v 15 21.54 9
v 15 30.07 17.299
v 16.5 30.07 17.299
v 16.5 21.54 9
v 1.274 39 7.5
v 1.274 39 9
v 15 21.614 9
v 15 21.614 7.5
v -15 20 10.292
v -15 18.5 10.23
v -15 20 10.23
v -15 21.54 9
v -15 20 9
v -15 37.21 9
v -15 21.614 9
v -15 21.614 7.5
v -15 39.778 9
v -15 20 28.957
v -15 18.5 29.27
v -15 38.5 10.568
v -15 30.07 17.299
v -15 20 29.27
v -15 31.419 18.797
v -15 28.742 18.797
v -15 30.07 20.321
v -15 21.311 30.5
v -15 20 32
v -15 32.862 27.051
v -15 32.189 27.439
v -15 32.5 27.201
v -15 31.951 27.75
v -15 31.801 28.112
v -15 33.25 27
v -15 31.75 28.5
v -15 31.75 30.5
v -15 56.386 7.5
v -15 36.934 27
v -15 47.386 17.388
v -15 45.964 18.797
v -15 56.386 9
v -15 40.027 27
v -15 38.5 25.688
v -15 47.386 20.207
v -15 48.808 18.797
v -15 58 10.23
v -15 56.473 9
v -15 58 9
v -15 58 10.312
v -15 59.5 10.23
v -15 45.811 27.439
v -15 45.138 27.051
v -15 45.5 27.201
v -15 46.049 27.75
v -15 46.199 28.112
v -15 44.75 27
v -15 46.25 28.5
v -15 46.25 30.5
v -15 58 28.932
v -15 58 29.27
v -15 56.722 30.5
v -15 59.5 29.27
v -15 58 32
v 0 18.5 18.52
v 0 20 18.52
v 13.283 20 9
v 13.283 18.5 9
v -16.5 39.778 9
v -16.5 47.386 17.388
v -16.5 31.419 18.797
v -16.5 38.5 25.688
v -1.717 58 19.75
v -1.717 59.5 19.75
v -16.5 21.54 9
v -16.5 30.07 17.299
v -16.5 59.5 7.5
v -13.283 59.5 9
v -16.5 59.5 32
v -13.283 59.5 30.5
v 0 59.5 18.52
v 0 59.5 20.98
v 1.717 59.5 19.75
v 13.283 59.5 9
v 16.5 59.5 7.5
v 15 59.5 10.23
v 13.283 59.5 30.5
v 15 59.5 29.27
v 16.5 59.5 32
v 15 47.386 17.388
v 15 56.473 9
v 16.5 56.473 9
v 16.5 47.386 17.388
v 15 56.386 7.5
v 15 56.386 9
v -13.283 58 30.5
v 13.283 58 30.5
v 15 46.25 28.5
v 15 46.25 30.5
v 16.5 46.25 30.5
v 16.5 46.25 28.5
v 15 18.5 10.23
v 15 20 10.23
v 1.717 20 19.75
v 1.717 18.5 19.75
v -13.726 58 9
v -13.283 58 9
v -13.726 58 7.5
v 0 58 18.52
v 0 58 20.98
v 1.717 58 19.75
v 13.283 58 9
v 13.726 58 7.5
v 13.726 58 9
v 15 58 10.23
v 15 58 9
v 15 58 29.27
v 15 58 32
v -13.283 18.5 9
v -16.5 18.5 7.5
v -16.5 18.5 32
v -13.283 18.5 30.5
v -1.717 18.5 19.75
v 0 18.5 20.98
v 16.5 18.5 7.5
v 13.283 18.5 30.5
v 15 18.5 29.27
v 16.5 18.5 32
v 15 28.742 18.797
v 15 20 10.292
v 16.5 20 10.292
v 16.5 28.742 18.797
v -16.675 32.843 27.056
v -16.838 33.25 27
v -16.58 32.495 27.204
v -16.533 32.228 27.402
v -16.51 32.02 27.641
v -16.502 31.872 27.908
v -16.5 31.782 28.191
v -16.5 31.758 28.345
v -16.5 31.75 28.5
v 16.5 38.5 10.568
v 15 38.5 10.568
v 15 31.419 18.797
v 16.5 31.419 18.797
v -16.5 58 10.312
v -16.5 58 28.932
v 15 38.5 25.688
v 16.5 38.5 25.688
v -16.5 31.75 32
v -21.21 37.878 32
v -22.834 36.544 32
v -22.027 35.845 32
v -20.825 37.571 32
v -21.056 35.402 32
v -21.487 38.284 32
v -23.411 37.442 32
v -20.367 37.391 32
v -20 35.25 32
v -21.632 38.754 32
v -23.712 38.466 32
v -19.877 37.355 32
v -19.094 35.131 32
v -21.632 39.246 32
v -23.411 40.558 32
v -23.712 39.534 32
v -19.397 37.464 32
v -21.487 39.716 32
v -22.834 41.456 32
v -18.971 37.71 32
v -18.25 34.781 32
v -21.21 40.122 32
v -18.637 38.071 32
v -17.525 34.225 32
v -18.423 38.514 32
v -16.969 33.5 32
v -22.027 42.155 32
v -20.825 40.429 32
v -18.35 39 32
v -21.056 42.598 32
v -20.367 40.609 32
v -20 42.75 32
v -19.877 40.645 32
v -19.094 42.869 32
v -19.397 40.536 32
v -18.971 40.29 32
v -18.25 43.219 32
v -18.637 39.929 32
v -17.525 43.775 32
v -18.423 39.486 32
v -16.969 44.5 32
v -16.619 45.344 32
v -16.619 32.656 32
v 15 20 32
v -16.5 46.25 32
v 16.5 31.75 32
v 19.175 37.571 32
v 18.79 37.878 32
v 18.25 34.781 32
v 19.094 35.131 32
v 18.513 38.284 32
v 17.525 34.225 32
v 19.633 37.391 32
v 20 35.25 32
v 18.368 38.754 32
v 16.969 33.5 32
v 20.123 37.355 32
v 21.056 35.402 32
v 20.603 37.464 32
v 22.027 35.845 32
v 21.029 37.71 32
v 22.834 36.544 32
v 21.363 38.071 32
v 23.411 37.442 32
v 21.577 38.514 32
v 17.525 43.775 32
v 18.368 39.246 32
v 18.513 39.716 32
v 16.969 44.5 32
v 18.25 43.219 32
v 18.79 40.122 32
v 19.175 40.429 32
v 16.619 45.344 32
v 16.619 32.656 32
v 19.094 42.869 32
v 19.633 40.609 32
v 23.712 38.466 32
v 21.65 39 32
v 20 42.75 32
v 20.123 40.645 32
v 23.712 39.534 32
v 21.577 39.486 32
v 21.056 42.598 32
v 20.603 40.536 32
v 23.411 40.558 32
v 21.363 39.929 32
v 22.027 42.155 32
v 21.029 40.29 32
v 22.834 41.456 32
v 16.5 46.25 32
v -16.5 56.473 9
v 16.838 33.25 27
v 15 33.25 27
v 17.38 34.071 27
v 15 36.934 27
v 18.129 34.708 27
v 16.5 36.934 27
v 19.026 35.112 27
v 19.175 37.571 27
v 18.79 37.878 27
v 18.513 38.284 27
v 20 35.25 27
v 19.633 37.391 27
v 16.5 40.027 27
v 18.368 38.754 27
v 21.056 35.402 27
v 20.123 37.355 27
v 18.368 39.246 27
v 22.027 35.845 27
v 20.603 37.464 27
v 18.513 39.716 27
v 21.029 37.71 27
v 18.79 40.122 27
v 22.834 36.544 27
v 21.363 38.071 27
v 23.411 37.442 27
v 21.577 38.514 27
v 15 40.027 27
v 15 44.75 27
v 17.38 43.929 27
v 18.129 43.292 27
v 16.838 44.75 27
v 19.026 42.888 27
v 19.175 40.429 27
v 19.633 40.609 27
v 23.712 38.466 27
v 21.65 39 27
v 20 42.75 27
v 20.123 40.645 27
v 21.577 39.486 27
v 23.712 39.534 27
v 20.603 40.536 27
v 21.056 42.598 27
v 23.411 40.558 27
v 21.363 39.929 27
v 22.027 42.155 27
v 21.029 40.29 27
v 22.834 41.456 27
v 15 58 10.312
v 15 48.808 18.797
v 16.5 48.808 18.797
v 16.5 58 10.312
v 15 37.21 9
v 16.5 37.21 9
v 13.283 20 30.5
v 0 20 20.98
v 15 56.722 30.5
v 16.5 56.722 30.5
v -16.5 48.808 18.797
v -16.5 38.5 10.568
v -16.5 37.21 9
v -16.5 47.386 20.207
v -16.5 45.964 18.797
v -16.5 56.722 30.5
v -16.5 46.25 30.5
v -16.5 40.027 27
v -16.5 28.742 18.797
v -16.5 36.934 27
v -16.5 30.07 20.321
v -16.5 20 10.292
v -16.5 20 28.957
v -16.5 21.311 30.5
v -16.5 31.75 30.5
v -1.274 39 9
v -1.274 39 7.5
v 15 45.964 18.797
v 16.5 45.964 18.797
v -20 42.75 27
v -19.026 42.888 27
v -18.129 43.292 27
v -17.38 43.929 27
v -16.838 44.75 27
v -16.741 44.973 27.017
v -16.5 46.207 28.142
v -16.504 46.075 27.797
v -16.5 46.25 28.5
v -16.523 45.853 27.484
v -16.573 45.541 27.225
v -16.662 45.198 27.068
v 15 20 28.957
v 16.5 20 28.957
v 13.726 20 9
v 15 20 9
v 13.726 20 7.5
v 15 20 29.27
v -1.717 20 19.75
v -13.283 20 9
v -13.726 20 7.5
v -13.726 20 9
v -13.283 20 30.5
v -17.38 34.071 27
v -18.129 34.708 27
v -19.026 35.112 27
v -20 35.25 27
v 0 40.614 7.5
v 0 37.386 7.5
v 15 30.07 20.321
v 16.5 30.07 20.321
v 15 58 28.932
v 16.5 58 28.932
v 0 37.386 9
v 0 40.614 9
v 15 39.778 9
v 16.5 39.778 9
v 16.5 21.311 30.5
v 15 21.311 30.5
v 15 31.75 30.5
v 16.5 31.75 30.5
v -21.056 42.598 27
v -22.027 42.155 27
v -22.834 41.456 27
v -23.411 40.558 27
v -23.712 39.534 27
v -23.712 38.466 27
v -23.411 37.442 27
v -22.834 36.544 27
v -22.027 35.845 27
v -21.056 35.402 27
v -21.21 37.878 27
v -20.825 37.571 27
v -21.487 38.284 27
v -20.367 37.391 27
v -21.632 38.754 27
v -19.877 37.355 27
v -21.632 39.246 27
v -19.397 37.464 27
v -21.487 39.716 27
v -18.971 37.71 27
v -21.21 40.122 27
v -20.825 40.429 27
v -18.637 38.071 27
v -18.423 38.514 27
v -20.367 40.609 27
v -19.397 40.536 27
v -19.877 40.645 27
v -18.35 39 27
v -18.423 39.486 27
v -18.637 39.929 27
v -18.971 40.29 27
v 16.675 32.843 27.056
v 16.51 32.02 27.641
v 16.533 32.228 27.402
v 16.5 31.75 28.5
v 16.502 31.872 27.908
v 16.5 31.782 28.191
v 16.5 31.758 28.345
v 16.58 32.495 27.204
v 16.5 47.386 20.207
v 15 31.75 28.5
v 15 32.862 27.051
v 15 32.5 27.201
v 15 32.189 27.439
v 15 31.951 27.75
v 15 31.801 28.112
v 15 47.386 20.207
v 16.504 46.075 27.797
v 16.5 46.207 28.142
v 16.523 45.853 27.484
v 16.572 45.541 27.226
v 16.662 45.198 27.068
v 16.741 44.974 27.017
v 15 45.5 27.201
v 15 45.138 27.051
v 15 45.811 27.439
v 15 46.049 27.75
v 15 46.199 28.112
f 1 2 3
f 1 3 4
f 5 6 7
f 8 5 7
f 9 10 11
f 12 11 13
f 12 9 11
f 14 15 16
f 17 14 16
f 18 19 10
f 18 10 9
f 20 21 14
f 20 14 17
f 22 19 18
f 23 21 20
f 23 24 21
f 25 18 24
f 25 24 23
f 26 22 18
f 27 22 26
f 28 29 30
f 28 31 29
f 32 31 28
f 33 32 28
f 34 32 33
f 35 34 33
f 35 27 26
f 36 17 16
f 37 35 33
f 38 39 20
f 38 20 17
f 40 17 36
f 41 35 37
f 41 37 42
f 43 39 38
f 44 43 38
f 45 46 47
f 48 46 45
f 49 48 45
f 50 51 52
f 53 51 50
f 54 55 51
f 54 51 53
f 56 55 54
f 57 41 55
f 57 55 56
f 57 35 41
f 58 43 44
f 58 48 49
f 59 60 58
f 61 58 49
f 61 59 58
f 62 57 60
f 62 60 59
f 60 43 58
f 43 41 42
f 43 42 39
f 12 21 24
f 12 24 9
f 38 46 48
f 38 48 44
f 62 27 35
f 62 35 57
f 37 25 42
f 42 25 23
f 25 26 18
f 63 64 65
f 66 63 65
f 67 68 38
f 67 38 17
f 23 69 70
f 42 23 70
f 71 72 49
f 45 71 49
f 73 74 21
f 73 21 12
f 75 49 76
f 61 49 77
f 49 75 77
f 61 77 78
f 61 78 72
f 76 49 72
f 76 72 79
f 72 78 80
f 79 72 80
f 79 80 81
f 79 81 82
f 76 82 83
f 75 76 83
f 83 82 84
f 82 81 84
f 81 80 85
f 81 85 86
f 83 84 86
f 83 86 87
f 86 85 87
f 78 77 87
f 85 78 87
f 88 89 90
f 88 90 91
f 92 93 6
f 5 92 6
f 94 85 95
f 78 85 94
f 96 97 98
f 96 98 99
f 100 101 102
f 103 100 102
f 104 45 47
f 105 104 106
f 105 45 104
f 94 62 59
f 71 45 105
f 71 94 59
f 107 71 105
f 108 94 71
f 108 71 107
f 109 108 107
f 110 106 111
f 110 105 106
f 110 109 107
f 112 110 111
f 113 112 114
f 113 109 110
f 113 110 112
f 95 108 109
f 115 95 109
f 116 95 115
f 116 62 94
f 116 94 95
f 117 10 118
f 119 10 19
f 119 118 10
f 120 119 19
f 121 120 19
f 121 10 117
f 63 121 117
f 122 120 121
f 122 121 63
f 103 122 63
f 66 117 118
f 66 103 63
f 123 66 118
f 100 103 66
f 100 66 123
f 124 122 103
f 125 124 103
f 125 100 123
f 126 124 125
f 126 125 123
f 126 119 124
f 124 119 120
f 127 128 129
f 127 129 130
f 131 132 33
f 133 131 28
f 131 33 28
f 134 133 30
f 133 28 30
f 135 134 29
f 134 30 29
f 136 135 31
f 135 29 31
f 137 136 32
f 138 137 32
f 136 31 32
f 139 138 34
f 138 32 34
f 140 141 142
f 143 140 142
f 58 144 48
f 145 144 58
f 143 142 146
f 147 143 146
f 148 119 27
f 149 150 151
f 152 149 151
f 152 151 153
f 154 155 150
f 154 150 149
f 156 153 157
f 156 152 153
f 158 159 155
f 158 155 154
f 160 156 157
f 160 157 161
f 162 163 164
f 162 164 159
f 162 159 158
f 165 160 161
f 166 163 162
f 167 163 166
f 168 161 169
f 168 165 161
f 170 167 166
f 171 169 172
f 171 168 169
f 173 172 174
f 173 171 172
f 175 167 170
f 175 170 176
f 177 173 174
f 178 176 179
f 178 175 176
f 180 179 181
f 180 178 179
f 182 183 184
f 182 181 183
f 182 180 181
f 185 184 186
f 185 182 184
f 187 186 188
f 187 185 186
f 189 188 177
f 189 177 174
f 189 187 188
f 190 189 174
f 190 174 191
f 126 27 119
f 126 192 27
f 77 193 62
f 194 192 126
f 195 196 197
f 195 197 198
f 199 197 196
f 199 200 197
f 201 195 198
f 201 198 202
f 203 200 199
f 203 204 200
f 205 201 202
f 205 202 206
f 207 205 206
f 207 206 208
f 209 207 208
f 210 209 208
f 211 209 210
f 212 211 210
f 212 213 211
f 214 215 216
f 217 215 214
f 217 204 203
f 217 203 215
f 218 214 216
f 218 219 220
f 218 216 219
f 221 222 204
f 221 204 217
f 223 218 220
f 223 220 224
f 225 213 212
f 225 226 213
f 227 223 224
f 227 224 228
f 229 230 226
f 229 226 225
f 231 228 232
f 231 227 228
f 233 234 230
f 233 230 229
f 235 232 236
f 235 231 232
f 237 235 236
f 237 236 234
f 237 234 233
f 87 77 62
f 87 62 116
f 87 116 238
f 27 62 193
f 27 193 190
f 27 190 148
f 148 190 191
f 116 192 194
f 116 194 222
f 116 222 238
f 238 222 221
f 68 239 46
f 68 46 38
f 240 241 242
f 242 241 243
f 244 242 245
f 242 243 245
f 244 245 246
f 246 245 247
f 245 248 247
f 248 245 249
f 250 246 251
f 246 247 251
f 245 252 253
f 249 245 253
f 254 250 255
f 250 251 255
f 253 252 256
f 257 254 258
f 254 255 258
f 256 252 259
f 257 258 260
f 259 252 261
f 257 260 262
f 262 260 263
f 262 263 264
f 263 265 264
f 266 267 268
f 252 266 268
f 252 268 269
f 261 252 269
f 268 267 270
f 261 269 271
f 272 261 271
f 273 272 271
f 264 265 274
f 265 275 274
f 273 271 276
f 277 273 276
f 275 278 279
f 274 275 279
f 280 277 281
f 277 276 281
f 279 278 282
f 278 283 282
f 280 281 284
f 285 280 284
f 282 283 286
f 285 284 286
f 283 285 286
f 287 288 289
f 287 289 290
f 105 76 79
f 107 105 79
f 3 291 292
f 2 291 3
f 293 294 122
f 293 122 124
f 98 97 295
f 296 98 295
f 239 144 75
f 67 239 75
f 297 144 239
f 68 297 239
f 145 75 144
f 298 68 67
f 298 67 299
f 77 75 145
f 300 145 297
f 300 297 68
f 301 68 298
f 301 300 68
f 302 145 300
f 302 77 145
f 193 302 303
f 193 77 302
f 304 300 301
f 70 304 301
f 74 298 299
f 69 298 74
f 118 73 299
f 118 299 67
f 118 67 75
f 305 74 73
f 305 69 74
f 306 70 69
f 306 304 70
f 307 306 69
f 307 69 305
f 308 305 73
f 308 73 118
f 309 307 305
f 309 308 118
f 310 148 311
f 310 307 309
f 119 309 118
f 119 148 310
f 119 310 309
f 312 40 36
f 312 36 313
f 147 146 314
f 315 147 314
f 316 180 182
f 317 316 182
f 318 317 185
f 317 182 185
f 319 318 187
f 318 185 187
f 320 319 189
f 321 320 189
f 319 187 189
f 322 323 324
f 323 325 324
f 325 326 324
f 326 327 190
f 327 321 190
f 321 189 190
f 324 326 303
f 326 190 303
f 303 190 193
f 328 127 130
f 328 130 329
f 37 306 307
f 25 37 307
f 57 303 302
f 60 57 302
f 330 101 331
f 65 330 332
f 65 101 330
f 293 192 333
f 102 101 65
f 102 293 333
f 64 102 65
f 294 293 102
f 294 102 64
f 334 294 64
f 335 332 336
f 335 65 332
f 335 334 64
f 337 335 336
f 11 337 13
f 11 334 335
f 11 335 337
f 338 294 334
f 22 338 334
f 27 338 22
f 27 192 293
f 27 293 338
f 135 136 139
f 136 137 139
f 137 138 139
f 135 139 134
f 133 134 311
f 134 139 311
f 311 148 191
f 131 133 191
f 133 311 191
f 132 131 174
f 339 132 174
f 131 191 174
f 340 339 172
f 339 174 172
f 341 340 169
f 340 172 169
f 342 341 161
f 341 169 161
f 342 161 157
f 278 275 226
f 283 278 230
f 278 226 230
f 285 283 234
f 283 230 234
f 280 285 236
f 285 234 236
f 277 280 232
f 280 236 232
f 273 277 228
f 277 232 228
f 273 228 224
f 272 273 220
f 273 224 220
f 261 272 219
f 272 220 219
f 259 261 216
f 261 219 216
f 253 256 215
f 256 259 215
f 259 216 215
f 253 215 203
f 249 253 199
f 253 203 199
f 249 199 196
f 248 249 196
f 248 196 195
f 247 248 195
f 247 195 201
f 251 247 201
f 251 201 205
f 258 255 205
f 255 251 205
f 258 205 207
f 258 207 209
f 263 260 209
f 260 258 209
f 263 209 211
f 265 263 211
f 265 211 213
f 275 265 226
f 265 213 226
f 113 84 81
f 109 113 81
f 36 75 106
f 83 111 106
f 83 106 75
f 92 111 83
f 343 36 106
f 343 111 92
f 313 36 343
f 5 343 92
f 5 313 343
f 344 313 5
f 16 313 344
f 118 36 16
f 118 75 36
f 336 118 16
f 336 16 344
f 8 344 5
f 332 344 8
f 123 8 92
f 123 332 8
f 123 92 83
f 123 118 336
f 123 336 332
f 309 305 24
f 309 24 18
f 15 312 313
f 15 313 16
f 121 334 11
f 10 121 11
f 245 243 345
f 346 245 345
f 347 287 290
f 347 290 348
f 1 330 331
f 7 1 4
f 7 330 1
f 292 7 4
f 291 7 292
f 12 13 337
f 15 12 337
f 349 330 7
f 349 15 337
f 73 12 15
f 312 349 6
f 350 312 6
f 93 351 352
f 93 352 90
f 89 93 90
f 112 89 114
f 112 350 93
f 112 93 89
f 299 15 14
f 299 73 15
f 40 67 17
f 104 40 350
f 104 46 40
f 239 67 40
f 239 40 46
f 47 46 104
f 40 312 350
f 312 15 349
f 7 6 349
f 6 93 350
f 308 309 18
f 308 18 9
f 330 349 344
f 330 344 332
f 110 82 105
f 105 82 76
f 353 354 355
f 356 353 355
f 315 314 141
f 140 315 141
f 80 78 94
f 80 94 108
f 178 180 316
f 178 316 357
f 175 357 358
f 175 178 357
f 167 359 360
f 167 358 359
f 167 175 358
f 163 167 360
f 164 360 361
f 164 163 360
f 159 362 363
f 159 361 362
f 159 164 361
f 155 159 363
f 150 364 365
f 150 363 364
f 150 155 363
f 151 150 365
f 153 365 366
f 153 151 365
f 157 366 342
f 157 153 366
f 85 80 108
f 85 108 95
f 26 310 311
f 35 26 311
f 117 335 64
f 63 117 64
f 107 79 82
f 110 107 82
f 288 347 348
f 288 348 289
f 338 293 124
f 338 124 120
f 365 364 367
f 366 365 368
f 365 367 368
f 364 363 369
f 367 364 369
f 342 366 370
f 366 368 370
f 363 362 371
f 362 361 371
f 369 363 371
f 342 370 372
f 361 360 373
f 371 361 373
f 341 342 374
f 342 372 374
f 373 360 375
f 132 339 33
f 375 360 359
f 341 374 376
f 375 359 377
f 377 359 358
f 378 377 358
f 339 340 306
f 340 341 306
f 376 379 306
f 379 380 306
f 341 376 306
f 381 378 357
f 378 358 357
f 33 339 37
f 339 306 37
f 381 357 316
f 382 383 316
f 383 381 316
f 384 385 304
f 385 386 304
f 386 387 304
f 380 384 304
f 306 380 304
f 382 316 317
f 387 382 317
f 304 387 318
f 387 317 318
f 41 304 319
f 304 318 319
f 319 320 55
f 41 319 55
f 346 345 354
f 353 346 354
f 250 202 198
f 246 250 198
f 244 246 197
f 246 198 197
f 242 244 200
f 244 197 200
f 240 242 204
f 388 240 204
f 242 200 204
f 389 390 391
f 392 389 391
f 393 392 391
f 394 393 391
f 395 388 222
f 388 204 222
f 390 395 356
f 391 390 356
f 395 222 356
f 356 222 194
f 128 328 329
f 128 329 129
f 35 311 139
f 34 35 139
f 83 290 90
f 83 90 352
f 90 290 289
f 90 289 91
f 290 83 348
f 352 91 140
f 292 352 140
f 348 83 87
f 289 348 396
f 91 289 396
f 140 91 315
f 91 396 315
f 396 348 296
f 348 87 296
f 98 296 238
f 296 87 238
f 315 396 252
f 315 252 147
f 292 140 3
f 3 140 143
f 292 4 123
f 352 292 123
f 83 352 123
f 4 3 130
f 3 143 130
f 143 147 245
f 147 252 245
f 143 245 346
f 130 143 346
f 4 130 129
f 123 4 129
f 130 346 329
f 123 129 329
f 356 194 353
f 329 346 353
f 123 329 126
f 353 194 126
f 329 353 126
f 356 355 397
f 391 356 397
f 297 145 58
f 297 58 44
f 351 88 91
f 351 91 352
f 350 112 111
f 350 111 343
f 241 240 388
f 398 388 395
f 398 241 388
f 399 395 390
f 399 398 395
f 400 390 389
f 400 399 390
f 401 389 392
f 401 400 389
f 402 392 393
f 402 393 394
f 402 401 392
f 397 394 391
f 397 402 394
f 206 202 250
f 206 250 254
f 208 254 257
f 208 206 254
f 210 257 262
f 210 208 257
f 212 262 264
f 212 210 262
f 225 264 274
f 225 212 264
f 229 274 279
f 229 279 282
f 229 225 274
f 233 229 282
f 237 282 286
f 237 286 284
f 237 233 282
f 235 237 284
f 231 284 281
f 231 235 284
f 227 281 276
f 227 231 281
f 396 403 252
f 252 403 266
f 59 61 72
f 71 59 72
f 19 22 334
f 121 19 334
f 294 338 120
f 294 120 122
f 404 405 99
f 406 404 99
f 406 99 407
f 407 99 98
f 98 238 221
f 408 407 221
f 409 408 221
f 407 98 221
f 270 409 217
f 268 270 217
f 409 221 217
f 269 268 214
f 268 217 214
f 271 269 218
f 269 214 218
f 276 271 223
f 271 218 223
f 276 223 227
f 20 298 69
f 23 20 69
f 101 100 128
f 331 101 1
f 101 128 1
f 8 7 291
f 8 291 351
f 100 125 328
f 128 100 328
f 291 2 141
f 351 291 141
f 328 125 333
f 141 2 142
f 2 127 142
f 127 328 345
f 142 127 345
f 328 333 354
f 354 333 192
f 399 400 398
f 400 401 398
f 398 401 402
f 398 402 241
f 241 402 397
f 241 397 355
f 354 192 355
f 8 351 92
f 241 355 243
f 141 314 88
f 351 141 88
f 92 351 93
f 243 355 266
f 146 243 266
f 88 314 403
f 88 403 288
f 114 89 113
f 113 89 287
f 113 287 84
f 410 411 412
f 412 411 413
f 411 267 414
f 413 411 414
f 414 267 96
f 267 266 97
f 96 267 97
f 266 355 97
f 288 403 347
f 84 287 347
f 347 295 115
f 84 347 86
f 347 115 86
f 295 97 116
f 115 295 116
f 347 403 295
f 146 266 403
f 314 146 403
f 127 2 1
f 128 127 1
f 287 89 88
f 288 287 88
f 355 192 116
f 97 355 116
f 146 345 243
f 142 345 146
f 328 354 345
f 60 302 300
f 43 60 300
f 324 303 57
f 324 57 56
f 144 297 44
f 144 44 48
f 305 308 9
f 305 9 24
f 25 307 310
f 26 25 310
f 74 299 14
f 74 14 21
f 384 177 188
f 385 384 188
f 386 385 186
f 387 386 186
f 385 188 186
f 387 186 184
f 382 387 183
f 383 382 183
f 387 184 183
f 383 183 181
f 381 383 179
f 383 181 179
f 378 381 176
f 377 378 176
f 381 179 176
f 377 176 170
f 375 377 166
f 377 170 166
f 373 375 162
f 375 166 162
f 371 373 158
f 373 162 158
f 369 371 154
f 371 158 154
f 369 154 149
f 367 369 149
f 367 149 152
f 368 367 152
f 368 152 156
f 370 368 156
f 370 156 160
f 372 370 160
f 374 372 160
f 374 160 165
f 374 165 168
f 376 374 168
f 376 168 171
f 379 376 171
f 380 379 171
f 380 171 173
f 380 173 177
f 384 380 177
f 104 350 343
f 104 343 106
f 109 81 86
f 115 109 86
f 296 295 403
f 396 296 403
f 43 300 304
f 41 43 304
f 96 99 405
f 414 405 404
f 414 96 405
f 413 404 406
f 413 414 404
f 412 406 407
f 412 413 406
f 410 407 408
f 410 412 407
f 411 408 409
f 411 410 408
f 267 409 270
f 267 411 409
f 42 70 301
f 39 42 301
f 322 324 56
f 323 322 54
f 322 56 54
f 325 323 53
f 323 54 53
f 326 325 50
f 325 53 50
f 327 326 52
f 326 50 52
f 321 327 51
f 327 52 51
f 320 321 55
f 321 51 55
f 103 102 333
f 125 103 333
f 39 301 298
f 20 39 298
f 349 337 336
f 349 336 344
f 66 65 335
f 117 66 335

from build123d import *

# Parameters (mm, degrees)
SKETCH072_R          = 1.65
SKETCH072_W          = 30
SKETCH072_H          = 38
PAD031_DEPTH         = 5
SKETCH073_W          = 33
SKETCH073_H          = 41
SKETCH073_W_2        = 30
SKETCH073_H_2        = 38
PAD032_DEPTH         = 18
SKETCH108_W          = 33
SKETCH108_H          = 41
PAD049_DEPTH         = 1.5
POCKET055_DEPTH      = 41.001
POCKET056_DEPTH      = 50
POCKET056_DEPTH_BACK = 5


with BuildPart() as part:
    # Sketch072 → Pad031 (new body)
    with BuildSketch(Plane.XY):
        with BuildLine():
            Line((16.5, 59.5), (-16.5, 59.5))
            Line((-16.5, 59.5), (-16.5, 46.25))
            ThreePointArc((-20, 42.75), (-17.525126, 43.775126), (-16.5, 46.25))
            ThreePointArc((-20, 42.75), (-23.75, 39), (-20, 35.25))
            ThreePointArc((-16.5, 31.75), (-17.525126, 34.224874), (-20, 35.25))
            Line((-16.5, 18.5), (-16.5, 31.75))
            Line((16.5, 18.5), (-16.5, 18.5))
            Line((16.5, 18.5), (16.5, 31.75))
            ThreePointArc((20, 35.25), (17.525126, 34.224874), (16.5, 31.75))
            ThreePointArc((20, 35.25), (23.75, 39), (20, 42.75))
            ThreePointArc((16.5, 46.25), (17.525126, 43.775126), (20, 42.75))
            Line((16.5, 59.5), (16.5, 46.25))
        make_face()
        with Locations((20, 39)):
            Circle(SKETCH072_R, mode=Mode.SUBTRACT)
        with Locations((-20, 39)):
            Circle(SKETCH072_R, mode=Mode.SUBTRACT)
        with Locations((0, 39)):
            Rectangle(SKETCH072_W, SKETCH072_H, mode=Mode.SUBTRACT)
    extrude(amount=-PAD031_DEPTH)

    # Sketch073 (on Face20 of Pad031) → Pad032 (join)
    with BuildSketch(Plane(origin=(0, 0, -5), x_dir=(1, 0, 0), z_dir=(0, 0, -1))):
        with Locations((0, -39)):
            Rectangle(SKETCH073_W, SKETCH073_H)
        with Locations((0, -39)):
            Rectangle(SKETCH073_W_2, SKETCH073_H_2, mode=Mode.SUBTRACT)
    extrude(amount=PAD032_DEPTH)

    # Sketch108 (on Face23 of Pad032) → Pad049 (join)
    with BuildSketch(Plane(origin=(0, 0, -23), x_dir=(1, 0, 0), z_dir=(0, 0, -1))):
        with Locations((0, -39)):
            Rectangle(SKETCH108_W, SKETCH108_H)
        Polygon((0, -40.613829), (-13.725924, -58), (13.725924, -58), align=None, mode=Mode.SUBTRACT)
        Polygon((15, -56.386171), (1.274076, -39), (15, -21.613829), align=None, mode=Mode.SUBTRACT)
        Polygon((13.725924, -20), (-13.725924, -20), (0, -37.386171), align=None, mode=Mode.SUBTRACT)
        Polygon((-1.274076, -39), (-15, -21.613829), (-15, -56.386171), align=None, mode=Mode.SUBTRACT)
    extrude(amount=PAD049_DEPTH)

    # Sketch109 (on Face5 of Pad049) → Pocket055 (cut, through all)
    with BuildSketch(Plane(origin=(0, 59.5, 0), x_dir=(-1, 0, 0), z_dir=(0, 1, 0))):
        Polygon((-15, -2.730289), (-15, -21.769711), (-1.716682, -12.25), align=None)
        Polygon((1.716682, -12.25), (15, -21.769711), (15, -2.730289), align=None)
        Polygon((-13.283318, -23), (13.283318, -23), (0, -13.480289), align=None)
        Polygon((-13.283318, -1.5), (13.283318, -1.5), (0, -11.019711), align=None)
    extrude(amount=-POCKET055_DEPTH, mode=Mode.SUBTRACT)

    # Sketch110 (on Face28 of Pocket055) → Pocket056 (cut, two sides)
    with BuildSketch(Plane(origin=(-16.5, 0, 0), x_dir=(0, -1, 0), z_dir=(-1, 0, 0))) as pocket056_sk:
        Polygon((-56.473161, -23), (-47.386076, -14.611922), (-39.778284, -23), align=None)
        Polygon((-58, -21.687574), (-58, -3.06762), (-48.807871, -13.202532), align=None)
        with BuildLine():
            Line((-56.721716, -1.5), (-47.386076, -11.793142))
            Line((-47.386076, -11.793142), (-40.026839, -5))
            Line((-40.026839, -5), (-44.75, -5))
            ThreePointArc((-46.25, -3.5), (-45.81066, -4.56066), (-44.75, -5))
            Line((-46.25, -1.5), (-46.25, -3.5))
            Line((-46.25, -1.5), (-56.721716, -1.5))
        make_face()
        with BuildLine():
            Line((-36.934247, -5), (-30.06962, -11.679097))
            Line((-30.06962, -11.679097), (-21.310863, -1.5))
            Line((-21.310863, -1.5), (-31.75, -1.5))
            Line((-31.75, -1.5), (-31.75, -3.5))
            ThreePointArc((-33.25, -5), (-32.18934, -4.56066), (-31.75, -3.5))
            Line((-36.934247, -5), (-33.25, -5))
        make_face()
        Polygon((-28.741998, -13.202532), (-20, -3.042912), (-20, -21.70826), align=None)
        Polygon((-37.210398, -23), (-30.06962, -14.701258), (-21.540358, -23), align=None)
        Polygon((-38.5, -21.43238), (-31.418503, -13.202532), (-38.5, -6.312426), (-45.964281, -13.202532), align=None)
    extrude(amount=-POCKET056_DEPTH, mode=Mode.SUBTRACT)
    extrude(pocket056_sk.sketch, amount=POCKET056_DEPTH_BACK, mode=Mode.SUBTRACT)


with BuildPart() as part_1:
    # Body023 placement: moved
    add(part.part.moved(Location((0, 0, 32))))


solid = part_1.part
